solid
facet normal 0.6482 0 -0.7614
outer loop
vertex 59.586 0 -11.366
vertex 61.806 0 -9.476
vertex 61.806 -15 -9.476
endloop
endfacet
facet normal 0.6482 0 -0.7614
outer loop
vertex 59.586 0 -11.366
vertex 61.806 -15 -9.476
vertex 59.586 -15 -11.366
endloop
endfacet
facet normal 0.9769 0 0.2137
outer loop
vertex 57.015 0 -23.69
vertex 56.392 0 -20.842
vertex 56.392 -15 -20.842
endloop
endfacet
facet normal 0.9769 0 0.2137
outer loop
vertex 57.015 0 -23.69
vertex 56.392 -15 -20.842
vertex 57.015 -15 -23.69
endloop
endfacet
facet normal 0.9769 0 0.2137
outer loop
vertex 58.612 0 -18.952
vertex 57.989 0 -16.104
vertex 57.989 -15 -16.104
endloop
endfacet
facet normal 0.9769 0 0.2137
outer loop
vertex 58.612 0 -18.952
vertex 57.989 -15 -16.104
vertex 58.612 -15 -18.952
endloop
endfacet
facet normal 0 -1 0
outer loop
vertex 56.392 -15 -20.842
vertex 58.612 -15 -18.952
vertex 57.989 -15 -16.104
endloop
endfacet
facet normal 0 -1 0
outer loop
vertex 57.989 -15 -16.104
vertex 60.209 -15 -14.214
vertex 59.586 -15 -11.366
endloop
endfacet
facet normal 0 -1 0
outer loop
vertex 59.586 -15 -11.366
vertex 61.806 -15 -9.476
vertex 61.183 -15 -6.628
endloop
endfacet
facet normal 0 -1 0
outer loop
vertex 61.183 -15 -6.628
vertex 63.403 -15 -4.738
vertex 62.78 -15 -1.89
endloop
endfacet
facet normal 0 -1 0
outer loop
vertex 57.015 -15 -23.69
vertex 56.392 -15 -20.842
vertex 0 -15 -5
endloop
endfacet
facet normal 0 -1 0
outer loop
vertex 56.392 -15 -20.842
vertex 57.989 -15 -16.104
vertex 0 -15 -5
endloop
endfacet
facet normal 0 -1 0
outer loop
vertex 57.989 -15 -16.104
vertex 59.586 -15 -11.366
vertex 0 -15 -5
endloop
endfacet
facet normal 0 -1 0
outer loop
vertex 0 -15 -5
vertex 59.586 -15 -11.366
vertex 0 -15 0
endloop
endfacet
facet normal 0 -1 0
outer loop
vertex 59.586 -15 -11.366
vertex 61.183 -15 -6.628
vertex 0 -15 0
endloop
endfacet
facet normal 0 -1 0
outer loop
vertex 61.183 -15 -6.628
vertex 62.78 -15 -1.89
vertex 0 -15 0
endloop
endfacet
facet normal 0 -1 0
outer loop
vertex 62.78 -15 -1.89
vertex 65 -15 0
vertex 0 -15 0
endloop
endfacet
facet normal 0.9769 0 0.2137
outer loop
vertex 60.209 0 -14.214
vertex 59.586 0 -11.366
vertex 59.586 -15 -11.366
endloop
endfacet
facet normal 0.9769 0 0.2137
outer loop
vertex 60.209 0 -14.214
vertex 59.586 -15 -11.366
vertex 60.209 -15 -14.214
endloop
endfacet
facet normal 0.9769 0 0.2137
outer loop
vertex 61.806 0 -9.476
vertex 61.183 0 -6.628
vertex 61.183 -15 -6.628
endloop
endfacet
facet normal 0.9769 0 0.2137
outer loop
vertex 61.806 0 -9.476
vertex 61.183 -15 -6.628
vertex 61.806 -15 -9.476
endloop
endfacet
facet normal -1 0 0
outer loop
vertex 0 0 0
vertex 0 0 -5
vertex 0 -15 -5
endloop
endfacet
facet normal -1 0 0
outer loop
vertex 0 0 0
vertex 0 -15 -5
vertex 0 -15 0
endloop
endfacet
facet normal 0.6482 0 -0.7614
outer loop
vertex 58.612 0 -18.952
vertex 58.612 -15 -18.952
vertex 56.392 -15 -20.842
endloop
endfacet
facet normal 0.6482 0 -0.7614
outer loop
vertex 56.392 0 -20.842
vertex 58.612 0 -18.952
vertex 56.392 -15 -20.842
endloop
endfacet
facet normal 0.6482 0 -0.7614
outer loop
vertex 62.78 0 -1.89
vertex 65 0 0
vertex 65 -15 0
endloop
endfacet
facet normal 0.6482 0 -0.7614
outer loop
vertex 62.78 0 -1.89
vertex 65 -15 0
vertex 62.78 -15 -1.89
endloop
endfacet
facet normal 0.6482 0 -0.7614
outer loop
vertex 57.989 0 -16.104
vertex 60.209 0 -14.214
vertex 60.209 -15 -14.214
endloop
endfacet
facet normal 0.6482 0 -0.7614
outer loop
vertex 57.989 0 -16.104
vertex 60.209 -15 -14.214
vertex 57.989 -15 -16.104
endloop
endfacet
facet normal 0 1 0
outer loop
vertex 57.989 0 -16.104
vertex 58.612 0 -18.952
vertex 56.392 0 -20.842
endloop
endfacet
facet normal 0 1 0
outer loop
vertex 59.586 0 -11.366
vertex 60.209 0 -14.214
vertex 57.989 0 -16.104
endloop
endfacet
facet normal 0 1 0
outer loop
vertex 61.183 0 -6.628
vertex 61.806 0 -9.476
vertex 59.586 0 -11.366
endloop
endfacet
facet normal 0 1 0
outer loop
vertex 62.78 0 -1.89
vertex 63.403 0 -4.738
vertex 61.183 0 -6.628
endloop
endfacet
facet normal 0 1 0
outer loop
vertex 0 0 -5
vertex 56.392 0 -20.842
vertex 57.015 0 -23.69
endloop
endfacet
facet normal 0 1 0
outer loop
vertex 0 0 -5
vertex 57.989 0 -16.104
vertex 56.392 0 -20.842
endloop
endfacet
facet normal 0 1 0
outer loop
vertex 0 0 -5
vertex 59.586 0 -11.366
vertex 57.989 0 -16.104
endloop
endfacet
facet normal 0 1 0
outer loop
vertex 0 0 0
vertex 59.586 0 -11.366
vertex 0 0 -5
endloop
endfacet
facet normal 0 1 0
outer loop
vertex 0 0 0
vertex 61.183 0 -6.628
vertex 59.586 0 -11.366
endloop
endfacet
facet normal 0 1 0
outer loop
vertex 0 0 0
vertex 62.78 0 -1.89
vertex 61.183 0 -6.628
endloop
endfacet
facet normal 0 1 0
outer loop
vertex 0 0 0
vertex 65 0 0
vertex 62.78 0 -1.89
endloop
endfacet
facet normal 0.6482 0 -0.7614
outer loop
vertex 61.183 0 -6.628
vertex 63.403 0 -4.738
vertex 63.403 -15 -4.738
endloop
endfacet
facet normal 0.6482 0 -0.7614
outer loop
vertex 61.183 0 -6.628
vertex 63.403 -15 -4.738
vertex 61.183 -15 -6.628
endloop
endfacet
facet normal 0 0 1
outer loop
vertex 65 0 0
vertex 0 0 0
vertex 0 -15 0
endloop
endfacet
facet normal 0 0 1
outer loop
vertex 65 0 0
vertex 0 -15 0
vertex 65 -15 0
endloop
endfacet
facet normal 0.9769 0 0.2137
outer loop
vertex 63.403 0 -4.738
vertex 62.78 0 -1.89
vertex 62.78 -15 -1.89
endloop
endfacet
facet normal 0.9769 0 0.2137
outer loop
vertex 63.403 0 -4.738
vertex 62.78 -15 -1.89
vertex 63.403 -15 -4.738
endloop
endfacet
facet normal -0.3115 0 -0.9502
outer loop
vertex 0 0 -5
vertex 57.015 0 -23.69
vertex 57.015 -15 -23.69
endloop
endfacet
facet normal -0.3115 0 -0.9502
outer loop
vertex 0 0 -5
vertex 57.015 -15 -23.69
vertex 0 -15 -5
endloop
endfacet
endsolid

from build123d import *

# Parameters (mm, degrees)
PAD_DEPTH = 15


with BuildPart() as part:
    # Sketch → Pad (new body)
    with BuildSketch(Plane.XZ):
        Polygon((0, 0), (65, 0), (62.780042, -1.889917), (63.402929, -4.738076), (61.182971, -6.627993), (61.805858, -9.476152), (59.5859, -11.366069), (60.208787, -14.214228), (57.988828, -16.104145), (58.611716, -18.952304), (56.391757, -20.842221), (57.014645, -23.69038), (0, -5), align=None)
    extrude(amount=PAD_DEPTH)


solid = part.part
